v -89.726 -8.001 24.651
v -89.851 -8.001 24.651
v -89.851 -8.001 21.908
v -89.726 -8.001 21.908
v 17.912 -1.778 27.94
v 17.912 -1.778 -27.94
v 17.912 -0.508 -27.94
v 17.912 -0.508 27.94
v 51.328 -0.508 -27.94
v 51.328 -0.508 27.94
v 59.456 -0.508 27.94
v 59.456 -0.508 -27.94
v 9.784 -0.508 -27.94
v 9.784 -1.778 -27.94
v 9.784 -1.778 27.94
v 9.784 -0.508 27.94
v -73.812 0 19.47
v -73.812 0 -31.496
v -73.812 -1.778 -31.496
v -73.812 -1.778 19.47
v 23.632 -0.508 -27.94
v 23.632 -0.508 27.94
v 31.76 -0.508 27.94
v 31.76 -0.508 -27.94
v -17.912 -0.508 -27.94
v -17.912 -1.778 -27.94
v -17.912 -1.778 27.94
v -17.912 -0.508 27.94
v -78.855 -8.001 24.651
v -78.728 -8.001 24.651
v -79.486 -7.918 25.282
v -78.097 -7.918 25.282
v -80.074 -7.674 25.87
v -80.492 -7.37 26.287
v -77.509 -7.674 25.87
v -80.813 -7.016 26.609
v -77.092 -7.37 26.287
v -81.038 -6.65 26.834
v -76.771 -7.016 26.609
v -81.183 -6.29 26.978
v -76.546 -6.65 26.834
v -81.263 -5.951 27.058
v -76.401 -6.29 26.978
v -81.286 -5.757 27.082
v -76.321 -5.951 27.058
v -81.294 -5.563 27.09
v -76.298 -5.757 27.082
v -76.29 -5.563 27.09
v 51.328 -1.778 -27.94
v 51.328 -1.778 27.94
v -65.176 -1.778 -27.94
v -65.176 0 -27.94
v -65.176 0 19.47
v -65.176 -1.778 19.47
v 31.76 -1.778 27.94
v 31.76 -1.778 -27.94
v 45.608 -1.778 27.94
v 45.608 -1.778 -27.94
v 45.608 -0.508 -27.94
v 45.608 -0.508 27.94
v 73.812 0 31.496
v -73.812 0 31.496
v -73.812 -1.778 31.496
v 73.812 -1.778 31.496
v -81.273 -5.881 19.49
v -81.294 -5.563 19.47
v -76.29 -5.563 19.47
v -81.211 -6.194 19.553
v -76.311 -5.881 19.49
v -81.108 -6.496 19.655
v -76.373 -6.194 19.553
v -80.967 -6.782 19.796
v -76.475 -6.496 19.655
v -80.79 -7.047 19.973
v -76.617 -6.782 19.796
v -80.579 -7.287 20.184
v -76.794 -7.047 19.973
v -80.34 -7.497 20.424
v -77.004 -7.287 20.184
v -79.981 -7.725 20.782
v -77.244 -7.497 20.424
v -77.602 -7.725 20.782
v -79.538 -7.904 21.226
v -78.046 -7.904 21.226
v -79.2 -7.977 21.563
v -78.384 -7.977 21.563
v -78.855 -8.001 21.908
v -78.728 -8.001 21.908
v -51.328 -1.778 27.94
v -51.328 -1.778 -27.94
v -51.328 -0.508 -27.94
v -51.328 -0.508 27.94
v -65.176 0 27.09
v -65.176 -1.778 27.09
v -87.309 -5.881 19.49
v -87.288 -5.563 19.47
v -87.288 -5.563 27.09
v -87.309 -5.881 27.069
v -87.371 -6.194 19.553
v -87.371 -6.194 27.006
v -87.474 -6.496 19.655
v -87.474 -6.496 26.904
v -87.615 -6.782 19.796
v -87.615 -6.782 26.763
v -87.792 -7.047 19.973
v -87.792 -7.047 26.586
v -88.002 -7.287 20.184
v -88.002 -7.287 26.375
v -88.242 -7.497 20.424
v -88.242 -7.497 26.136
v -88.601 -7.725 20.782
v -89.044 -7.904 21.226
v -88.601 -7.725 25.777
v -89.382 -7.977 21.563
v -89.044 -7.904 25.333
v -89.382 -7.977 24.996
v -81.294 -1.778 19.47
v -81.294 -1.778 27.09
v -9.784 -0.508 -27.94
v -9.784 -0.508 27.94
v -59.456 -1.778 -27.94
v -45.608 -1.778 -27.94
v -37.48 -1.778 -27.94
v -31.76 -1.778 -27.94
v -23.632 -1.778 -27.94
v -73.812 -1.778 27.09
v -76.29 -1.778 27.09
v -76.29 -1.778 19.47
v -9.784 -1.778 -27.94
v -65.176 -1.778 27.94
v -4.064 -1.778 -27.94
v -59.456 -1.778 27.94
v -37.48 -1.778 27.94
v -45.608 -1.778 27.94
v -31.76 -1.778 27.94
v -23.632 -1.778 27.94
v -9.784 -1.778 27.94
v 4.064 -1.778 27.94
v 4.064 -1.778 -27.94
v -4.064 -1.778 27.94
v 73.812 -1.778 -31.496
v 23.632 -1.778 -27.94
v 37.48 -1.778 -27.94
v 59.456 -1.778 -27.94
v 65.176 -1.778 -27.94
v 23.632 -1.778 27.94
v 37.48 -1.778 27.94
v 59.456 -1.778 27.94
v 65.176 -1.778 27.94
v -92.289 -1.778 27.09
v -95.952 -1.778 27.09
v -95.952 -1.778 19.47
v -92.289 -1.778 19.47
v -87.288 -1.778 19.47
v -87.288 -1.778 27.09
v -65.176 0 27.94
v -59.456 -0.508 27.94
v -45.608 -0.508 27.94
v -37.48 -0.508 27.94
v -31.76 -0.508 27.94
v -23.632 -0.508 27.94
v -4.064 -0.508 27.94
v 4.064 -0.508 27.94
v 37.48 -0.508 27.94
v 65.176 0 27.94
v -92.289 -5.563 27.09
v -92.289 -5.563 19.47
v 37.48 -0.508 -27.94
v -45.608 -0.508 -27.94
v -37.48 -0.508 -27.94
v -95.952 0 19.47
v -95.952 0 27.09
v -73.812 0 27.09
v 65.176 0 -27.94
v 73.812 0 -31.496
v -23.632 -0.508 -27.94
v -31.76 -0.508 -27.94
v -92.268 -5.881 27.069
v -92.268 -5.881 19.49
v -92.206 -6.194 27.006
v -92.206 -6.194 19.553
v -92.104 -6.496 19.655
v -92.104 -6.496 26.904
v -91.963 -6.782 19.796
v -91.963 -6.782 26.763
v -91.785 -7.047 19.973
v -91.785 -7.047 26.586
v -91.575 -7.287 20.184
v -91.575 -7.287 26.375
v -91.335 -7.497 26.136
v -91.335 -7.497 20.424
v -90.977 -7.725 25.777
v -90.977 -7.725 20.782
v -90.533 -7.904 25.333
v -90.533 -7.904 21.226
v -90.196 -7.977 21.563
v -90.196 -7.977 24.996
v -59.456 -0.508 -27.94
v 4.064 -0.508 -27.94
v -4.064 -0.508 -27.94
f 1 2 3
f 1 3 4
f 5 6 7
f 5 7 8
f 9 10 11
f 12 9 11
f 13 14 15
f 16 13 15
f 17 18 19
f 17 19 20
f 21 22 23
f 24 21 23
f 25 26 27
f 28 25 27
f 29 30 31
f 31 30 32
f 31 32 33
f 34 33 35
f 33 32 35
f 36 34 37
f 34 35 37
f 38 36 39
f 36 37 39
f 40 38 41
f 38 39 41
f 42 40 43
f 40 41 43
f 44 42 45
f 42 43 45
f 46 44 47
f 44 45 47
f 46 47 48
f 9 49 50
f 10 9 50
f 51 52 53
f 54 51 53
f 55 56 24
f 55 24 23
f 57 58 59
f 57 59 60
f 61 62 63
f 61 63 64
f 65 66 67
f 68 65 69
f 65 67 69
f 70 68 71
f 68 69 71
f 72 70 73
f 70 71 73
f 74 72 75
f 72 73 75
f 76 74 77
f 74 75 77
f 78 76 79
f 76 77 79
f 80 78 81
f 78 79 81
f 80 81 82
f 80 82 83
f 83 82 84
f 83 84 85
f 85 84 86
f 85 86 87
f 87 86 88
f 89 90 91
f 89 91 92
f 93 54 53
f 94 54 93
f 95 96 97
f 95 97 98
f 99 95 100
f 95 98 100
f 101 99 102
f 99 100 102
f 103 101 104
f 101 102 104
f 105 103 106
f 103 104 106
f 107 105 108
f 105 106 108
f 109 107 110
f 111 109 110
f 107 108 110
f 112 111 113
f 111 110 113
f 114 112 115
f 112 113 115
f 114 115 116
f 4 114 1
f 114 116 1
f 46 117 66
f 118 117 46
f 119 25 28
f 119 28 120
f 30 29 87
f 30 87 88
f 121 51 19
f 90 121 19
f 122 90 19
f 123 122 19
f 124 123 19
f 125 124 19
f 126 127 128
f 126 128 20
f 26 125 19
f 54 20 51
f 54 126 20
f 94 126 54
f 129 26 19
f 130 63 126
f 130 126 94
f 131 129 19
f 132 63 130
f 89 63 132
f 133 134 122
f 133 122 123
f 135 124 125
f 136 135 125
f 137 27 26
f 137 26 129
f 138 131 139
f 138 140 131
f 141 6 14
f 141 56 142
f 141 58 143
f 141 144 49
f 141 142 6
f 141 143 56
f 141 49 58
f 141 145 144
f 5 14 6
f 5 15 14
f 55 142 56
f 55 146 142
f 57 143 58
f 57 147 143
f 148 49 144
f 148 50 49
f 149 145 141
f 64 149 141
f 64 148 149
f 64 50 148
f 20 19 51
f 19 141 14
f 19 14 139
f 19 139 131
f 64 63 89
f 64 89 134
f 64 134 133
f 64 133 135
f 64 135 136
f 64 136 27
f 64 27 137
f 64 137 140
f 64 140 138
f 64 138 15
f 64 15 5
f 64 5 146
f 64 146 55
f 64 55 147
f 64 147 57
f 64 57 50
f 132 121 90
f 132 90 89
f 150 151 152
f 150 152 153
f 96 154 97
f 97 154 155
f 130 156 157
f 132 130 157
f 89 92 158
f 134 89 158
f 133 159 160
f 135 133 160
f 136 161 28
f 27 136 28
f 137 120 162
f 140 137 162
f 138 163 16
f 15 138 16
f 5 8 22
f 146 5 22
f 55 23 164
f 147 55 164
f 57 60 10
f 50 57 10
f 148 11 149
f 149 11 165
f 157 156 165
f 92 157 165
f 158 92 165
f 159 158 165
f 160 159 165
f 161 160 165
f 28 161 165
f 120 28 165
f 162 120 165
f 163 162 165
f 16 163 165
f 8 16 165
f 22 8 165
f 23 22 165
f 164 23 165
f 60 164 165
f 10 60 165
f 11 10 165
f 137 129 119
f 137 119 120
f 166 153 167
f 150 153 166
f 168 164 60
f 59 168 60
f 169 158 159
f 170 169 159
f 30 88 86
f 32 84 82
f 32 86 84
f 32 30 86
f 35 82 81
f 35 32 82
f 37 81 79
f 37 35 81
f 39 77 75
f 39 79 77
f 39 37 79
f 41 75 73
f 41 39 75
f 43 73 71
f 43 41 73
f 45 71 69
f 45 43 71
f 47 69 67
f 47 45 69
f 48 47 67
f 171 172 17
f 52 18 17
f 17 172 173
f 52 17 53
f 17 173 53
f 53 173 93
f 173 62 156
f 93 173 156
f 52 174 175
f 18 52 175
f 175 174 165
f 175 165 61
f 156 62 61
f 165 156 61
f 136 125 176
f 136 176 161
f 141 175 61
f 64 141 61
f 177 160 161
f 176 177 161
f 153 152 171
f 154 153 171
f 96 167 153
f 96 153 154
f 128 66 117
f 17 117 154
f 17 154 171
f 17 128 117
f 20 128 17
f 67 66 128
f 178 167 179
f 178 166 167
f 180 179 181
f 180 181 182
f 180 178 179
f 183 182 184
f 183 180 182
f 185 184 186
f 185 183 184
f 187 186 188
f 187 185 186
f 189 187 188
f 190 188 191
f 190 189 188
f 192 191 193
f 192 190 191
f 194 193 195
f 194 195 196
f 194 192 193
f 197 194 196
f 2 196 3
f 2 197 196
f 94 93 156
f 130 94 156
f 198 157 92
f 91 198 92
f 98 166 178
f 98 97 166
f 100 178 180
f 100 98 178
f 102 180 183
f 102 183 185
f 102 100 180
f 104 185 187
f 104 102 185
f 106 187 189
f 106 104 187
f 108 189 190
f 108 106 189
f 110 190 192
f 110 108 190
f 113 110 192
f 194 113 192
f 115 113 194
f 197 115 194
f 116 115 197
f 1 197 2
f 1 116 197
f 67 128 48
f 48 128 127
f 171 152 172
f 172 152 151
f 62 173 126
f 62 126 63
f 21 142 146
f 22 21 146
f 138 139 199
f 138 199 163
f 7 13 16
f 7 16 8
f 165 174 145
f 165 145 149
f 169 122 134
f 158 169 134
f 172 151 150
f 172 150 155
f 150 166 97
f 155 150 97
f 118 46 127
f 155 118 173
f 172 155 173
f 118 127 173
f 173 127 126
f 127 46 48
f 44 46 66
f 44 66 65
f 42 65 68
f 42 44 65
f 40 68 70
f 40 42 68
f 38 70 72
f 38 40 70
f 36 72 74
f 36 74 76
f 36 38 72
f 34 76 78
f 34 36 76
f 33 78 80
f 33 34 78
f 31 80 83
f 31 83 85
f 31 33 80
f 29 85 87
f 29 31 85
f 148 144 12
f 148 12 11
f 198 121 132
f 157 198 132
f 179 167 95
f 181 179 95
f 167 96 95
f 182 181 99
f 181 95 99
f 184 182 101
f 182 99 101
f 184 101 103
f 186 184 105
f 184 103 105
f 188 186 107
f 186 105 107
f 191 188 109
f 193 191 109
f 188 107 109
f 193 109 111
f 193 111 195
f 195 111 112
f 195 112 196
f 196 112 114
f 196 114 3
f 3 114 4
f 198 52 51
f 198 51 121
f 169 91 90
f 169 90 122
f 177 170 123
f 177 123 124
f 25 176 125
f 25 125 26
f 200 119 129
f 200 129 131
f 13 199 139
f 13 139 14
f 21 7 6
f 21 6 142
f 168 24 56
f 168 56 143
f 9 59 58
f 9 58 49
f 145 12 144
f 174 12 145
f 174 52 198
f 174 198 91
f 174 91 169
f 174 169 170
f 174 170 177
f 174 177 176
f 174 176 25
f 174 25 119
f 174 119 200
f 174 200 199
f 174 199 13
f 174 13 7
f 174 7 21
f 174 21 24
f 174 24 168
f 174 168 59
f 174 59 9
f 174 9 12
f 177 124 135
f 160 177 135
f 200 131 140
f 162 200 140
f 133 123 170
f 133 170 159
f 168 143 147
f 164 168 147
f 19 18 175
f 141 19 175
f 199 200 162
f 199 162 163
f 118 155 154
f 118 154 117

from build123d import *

# Parameters (mm, degrees)
F0_W     = 147.6248
F0_H     = 62.992
F0_W_2   = 130.3528
F0_H_2   = 55.88
F1_DEPTH = 1.778
F2_W     = 8.128
F2_H     = 55.88
F3_DEPTH = 1.27
F4_W     = 30.776053
F4_H     = 7.62
F5_DEPTH = 1.778
F7_W     = 5.00126
F7_H     = 7.62
F7_W_2   = 5.0038
F8_DEPTH = 6.223
F9_R     = 2.4384
F10_R    = 2.4384


with BuildPart() as f1:
    # F0 (on Front) → F1 (new body)
    with BuildSketch(Plane.XZ):
        Rectangle(F0_W, F0_H)
        Rectangle(F0_W_2, F0_H_2, mode=Mode.SUBTRACT)
    extrude(amount=F1_DEPTH)

    # F2 (on face) → F3 (join)
    with BuildSketch(Plane.XZ.offset(1.778)):
        with Locations((-55.39232, 0)):
            Rectangle(F2_W, F2_H)
        with Locations((-41.54424, 0)):
            Rectangle(F2_W, F2_H)
        with Locations((-27.69616, 0)):
            Rectangle(F2_W, F2_H)
        with Locations((-13.84808, 0)):
            Rectangle(F2_W, F2_H)
        Rectangle(F2_W, F2_H)
        with Locations((13.84808, 0)):
            Rectangle(F2_W, F2_H)
        with Locations((27.69616, 0)):
            Rectangle(F2_W, F2_H)
        with Locations((41.54424, 0)):
            Rectangle(F2_W, F2_H)
        with Locations((55.39232, 0)):
            Rectangle(F2_W, F2_H)
    extrude(amount=-F3_DEPTH)

    # F4 (on face) → F5 (join)
    with BuildSketch(Plane.XZ.offset(1.778)):
        with Locations((-80.564426, 23.279527)):
            Rectangle(F4_W, F4_H)
    extrude(amount=-F5_DEPTH)

    # F7 (on face) → F8 (join)
    with BuildSketch(Plane.XZ.offset(1.778)):
        with Locations((-89.788674, 23.279527)):
            Rectangle(F7_W, F7_H)
        with Locations((-78.791744, 23.279527)):
            Rectangle(F7_W_2, F7_H)
    extrude(amount=F8_DEPTH)

    # F9
    f9_edges = [f1.edges().sort_by_distance(p)[0] for p in [
        (-87.288044, -8.001, 23.279527),
        (-89.788674, -8.001, 27.089527),
        (-92.289304, -8.001, 23.279527),
        (-89.788674, -8.001, 19.469527),
    ]]
    fillet(f9_edges, radius=F9_R)

    # F10
    f10_edges = [f1.edges().sort_by_distance(p)[0] for p in [
        (-78.791744, -8.001, 27.089527),
        (-81.293644, -8.001, 23.279527),
        (-78.791744, -8.001, 19.469527),
        (-76.289844, -8.001, 23.279527),
    ]]
    fillet(f10_edges, radius=F10_R)


solid = f1.part
